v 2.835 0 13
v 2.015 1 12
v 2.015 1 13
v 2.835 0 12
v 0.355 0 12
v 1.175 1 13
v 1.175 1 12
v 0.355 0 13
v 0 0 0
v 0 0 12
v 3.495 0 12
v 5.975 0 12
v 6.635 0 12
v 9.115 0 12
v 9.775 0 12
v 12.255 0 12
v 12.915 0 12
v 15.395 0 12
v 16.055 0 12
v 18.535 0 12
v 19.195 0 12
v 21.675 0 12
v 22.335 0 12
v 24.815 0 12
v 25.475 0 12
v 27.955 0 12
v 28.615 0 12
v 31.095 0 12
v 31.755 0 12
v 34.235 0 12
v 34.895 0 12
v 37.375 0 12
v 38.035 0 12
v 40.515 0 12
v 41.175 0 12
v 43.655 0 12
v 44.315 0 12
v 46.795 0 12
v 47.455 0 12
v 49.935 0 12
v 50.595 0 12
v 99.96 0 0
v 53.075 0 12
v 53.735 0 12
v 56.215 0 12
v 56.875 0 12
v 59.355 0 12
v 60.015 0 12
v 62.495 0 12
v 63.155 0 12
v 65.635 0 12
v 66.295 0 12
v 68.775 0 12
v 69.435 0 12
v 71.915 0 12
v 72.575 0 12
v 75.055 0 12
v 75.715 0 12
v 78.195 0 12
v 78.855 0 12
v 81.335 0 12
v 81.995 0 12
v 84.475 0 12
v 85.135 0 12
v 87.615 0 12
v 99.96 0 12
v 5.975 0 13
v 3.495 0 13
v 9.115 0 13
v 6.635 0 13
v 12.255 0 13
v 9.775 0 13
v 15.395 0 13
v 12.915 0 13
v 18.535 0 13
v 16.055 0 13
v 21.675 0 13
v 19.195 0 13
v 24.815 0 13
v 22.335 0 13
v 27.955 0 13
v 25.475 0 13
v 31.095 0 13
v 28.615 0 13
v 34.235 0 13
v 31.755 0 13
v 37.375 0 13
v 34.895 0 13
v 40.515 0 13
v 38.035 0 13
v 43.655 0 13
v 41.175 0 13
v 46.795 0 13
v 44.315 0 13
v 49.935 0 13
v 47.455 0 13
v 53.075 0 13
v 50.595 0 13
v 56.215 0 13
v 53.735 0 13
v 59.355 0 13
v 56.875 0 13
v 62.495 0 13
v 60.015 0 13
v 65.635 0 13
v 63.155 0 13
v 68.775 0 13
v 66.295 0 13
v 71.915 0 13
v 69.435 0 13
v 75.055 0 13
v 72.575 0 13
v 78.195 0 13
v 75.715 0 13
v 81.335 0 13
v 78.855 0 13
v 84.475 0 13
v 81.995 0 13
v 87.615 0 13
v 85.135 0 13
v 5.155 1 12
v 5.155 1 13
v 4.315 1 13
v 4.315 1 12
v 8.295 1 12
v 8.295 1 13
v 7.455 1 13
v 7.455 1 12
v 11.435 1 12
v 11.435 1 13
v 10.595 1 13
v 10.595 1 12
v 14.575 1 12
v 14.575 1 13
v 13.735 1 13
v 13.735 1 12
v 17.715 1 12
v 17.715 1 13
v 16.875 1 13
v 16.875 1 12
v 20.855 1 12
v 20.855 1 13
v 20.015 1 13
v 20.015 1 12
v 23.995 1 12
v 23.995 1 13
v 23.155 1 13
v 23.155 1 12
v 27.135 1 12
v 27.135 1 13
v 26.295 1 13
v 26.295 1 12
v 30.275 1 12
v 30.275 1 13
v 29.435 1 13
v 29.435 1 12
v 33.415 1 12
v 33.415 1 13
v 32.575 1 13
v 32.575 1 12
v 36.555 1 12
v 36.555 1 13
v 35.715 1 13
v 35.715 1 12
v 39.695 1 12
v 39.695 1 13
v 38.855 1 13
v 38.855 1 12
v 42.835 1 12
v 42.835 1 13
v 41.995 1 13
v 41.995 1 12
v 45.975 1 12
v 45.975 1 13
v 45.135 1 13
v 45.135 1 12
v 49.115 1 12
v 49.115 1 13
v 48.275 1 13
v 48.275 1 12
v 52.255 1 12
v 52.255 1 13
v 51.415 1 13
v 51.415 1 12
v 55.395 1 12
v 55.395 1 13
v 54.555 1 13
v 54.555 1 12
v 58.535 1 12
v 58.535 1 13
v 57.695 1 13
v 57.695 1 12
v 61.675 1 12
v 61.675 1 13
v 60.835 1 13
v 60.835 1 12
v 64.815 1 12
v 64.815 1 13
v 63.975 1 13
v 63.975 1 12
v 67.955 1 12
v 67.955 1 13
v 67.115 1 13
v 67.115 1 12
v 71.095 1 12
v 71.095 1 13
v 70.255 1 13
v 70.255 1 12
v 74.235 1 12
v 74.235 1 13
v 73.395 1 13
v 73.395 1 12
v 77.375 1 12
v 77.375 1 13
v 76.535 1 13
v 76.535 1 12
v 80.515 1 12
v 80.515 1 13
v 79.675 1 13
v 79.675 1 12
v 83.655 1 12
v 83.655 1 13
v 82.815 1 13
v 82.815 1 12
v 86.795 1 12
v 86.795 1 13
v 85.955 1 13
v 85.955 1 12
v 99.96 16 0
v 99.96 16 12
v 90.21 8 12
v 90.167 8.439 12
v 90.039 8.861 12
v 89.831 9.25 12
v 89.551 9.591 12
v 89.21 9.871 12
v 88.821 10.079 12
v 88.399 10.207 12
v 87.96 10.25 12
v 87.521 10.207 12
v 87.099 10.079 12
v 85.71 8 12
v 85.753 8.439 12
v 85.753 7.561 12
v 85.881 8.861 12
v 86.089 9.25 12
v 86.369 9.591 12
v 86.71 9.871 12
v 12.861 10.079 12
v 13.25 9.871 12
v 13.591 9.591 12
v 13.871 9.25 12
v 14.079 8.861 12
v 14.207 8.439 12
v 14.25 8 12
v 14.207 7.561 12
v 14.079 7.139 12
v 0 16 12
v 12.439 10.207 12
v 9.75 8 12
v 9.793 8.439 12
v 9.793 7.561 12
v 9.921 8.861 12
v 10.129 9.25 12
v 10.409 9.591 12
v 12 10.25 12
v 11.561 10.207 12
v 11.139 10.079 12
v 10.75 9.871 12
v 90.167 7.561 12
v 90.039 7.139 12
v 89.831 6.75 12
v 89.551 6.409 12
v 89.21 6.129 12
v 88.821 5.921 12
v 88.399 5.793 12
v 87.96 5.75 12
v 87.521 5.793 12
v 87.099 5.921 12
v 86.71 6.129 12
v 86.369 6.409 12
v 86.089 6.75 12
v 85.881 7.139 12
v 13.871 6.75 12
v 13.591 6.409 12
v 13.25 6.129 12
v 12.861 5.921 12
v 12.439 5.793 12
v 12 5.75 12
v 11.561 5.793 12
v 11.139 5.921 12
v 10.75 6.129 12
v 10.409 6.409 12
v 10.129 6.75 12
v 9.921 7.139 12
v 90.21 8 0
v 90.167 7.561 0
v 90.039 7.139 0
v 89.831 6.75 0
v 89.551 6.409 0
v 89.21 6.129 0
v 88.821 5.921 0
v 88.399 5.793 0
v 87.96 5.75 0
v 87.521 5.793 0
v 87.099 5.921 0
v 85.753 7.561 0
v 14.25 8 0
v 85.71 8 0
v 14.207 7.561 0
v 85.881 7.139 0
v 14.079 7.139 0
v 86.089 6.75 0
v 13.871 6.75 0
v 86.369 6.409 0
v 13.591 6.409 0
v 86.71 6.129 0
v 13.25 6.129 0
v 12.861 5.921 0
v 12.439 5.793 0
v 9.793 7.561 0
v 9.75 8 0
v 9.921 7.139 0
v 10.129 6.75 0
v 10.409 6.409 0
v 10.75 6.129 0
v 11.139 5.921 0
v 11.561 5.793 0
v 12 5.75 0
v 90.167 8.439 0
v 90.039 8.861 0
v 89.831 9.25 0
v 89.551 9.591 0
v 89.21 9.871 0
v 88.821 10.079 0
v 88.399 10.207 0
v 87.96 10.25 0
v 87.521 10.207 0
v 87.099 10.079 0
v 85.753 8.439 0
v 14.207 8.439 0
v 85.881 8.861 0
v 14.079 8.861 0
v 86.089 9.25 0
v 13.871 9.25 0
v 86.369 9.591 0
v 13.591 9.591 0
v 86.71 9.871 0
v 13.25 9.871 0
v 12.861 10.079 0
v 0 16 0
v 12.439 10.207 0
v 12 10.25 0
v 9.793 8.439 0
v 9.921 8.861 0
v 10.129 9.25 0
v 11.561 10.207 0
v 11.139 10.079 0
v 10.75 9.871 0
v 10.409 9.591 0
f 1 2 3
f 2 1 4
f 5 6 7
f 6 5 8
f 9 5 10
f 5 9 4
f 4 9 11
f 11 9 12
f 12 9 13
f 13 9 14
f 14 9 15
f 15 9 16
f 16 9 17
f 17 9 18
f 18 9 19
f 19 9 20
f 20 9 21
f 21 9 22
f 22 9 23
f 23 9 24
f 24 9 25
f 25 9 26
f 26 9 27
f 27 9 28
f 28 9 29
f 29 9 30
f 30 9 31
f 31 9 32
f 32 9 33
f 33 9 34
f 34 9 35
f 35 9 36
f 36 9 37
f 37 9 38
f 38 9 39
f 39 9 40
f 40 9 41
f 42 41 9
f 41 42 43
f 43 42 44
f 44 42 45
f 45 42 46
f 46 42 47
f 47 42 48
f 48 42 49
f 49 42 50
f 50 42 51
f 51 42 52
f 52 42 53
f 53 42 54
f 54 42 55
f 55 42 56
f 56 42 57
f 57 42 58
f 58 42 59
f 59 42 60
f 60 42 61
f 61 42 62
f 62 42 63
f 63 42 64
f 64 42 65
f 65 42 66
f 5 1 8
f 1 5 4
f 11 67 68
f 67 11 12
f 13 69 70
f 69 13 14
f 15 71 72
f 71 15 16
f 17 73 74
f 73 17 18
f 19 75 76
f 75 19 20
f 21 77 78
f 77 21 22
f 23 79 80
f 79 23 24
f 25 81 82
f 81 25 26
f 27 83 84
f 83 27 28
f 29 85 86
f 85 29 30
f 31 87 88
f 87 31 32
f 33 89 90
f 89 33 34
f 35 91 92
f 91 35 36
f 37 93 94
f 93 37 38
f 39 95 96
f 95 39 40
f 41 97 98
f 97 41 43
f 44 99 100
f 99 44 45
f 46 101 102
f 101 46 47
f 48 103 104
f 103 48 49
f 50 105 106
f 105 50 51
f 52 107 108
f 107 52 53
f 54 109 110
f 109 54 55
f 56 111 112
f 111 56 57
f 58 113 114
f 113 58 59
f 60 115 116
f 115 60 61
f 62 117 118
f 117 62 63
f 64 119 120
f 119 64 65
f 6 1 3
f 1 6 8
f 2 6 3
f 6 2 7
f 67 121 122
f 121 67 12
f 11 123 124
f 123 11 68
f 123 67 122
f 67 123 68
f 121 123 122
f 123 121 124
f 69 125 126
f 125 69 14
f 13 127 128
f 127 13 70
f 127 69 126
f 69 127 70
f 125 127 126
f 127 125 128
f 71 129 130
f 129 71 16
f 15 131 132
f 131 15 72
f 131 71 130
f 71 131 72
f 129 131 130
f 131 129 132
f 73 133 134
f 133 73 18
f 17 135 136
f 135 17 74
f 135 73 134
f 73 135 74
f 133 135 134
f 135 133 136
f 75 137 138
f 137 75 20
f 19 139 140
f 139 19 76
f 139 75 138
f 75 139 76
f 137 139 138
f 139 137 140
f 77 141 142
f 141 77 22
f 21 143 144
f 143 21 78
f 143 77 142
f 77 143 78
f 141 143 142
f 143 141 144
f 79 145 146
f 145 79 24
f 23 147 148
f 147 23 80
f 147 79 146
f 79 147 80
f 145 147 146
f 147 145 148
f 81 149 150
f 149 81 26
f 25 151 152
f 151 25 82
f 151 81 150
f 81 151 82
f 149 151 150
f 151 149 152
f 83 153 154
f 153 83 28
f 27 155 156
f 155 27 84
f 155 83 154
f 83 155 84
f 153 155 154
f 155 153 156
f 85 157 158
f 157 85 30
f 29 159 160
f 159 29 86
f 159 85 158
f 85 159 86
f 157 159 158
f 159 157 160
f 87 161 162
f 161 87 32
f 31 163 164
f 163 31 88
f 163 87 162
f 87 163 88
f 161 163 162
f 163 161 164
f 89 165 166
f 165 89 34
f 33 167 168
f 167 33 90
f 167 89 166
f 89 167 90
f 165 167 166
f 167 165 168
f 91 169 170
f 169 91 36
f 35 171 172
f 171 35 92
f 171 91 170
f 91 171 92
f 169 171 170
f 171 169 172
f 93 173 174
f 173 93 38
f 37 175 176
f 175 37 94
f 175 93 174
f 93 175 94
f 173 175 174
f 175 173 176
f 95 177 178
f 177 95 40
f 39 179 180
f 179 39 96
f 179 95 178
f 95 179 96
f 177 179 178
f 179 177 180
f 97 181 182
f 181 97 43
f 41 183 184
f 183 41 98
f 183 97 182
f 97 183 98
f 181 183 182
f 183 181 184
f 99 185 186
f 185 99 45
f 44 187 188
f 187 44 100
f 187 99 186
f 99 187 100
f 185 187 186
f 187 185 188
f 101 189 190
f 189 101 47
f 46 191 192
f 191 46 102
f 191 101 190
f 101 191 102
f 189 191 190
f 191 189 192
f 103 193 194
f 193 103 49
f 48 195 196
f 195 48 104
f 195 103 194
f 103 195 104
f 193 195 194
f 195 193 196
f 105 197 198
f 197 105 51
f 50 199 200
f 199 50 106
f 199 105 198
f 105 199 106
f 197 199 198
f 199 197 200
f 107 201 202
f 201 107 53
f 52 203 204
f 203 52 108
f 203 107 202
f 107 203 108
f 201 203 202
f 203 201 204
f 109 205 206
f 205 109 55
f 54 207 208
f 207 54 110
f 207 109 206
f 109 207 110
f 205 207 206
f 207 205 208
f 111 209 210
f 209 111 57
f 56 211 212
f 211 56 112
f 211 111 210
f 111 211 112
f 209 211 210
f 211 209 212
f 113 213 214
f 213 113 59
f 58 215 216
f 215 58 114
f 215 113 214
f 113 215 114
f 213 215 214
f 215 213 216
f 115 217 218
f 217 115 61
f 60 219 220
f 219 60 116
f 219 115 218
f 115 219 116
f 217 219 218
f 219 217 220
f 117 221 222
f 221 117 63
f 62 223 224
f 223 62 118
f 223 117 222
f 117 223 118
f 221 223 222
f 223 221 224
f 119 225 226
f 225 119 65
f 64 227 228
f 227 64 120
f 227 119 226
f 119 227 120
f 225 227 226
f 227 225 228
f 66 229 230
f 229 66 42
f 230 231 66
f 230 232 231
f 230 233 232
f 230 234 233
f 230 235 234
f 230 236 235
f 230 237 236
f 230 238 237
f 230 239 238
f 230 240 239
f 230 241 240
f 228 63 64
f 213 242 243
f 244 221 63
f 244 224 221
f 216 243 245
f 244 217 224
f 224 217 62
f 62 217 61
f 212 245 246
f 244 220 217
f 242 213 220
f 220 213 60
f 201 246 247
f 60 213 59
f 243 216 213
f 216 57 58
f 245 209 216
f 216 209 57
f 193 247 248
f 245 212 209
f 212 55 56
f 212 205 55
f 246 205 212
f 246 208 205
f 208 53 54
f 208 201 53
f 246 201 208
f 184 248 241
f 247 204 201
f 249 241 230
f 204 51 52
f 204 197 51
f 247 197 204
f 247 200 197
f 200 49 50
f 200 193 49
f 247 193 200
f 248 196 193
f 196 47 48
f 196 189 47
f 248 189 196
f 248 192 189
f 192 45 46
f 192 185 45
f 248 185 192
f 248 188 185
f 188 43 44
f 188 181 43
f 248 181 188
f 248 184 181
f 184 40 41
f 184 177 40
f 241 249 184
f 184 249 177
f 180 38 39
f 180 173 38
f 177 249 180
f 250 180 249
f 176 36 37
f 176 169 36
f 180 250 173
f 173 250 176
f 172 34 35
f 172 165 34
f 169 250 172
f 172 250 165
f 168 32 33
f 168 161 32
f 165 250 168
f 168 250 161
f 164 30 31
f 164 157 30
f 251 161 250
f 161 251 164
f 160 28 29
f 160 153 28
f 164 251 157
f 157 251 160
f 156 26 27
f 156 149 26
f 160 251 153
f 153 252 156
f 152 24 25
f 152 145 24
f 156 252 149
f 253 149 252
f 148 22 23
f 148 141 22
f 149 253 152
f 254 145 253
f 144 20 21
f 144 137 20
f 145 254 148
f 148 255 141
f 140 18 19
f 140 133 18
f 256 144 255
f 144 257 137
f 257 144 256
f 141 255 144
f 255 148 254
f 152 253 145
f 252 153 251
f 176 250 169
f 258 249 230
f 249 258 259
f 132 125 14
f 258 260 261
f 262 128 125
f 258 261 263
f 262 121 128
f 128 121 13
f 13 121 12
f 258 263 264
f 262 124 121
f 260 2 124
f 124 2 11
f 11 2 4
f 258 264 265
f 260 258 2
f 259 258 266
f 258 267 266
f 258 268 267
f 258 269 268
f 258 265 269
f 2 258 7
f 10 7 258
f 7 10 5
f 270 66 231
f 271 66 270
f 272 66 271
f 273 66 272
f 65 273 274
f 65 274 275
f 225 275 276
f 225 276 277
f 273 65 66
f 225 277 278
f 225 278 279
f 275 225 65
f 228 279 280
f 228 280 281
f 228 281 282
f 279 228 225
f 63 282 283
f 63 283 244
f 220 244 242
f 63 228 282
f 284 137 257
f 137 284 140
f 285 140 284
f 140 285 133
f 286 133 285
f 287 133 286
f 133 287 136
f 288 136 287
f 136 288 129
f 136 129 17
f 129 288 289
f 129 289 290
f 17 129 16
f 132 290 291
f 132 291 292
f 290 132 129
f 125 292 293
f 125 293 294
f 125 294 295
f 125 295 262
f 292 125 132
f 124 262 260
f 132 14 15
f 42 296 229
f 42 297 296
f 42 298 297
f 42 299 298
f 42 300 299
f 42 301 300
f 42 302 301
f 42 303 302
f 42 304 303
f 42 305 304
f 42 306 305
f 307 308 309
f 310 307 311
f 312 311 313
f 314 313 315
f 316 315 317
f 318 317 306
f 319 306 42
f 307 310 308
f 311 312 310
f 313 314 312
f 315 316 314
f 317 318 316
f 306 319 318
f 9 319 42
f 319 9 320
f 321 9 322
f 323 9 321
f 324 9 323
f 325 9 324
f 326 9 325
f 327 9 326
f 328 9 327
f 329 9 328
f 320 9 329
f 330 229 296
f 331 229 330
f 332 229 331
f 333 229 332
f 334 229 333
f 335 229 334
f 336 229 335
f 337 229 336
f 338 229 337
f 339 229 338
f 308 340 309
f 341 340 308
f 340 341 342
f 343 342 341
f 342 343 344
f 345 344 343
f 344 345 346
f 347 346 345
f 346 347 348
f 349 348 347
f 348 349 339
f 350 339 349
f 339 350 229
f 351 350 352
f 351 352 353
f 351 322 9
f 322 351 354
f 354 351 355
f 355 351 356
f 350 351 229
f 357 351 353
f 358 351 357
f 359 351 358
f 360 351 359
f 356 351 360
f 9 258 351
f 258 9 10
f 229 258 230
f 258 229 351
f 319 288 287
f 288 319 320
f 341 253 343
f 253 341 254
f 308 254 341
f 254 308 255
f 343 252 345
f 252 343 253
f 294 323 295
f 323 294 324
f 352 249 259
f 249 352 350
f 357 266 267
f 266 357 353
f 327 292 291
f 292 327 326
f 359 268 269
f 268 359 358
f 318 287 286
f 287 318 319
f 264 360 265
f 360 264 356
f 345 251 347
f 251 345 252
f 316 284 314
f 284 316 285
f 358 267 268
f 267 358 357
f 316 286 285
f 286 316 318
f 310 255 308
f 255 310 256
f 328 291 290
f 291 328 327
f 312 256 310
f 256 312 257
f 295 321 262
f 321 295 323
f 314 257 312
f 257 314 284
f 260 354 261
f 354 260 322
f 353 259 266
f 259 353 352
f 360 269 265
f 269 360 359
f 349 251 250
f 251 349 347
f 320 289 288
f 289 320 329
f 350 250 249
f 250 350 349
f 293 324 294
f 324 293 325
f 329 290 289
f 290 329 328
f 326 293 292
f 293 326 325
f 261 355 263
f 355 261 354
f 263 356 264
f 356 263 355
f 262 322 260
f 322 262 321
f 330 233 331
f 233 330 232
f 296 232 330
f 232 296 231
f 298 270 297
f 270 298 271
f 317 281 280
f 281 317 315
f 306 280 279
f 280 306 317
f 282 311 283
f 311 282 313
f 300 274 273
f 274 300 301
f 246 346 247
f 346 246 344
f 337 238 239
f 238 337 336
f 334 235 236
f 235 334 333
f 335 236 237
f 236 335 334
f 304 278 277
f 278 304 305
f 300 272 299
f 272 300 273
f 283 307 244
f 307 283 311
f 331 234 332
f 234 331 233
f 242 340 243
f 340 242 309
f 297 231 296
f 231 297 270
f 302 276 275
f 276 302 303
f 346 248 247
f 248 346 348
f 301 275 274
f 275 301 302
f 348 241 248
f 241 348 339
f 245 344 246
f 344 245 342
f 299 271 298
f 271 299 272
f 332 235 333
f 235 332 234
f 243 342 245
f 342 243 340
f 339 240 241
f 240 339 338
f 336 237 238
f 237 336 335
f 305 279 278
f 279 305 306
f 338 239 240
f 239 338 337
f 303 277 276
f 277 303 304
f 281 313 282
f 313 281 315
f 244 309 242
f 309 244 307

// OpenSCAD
$fn = 32;

// ----------------------------------------------------------------------
// Gear rack: m=1 z=28, 99.96 x 16 x 13 mm
// ----------------------------------------------------------------------

// --- parameters (mm) ---
length = 99.96;           // rack length, X
width = 16;               // rack width, Y
height = 13;              // overall height, Z
module_m = 1;             // module
back_t = 12;              // tooth root line height
pitch = 3.14;             // circular pitch
tip_w = 0.84;             // tooth thickness at the tip
root_w = 2.48;            // tooth thickness at the root line
hole_d = 4.5;             // mounting hole
sink = 0.6;               // tooth root overlap into the body

tooth_span = 87.97;

module tooth(x0) {
  /* 20 deg flank profile, sunk into the body for a positive overlap */
  translate([x0, 0, back_t - sink])
    linear_extrude(height = height - back_t + sink)
      polygon(points = [[-root_w / 2, 0], [root_w / 2, 0],
                        [tip_w / 2, height - back_t],
                        [-tip_w / 2, height - back_t]]);
}

difference() {
  union() {
    cube([length, width, back_t]);
    for (i = [0 : 28 - 1])
      tooth((i + 0.5) * pitch + (tooth_span - 28 * pitch) / 2);
  }
  translate([12, 8, -1]) cylinder(h = back_t + 2, d = hole_d);
  translate([87.96, 8, -1]) cylinder(h = back_t + 2, d = hole_d);
}
